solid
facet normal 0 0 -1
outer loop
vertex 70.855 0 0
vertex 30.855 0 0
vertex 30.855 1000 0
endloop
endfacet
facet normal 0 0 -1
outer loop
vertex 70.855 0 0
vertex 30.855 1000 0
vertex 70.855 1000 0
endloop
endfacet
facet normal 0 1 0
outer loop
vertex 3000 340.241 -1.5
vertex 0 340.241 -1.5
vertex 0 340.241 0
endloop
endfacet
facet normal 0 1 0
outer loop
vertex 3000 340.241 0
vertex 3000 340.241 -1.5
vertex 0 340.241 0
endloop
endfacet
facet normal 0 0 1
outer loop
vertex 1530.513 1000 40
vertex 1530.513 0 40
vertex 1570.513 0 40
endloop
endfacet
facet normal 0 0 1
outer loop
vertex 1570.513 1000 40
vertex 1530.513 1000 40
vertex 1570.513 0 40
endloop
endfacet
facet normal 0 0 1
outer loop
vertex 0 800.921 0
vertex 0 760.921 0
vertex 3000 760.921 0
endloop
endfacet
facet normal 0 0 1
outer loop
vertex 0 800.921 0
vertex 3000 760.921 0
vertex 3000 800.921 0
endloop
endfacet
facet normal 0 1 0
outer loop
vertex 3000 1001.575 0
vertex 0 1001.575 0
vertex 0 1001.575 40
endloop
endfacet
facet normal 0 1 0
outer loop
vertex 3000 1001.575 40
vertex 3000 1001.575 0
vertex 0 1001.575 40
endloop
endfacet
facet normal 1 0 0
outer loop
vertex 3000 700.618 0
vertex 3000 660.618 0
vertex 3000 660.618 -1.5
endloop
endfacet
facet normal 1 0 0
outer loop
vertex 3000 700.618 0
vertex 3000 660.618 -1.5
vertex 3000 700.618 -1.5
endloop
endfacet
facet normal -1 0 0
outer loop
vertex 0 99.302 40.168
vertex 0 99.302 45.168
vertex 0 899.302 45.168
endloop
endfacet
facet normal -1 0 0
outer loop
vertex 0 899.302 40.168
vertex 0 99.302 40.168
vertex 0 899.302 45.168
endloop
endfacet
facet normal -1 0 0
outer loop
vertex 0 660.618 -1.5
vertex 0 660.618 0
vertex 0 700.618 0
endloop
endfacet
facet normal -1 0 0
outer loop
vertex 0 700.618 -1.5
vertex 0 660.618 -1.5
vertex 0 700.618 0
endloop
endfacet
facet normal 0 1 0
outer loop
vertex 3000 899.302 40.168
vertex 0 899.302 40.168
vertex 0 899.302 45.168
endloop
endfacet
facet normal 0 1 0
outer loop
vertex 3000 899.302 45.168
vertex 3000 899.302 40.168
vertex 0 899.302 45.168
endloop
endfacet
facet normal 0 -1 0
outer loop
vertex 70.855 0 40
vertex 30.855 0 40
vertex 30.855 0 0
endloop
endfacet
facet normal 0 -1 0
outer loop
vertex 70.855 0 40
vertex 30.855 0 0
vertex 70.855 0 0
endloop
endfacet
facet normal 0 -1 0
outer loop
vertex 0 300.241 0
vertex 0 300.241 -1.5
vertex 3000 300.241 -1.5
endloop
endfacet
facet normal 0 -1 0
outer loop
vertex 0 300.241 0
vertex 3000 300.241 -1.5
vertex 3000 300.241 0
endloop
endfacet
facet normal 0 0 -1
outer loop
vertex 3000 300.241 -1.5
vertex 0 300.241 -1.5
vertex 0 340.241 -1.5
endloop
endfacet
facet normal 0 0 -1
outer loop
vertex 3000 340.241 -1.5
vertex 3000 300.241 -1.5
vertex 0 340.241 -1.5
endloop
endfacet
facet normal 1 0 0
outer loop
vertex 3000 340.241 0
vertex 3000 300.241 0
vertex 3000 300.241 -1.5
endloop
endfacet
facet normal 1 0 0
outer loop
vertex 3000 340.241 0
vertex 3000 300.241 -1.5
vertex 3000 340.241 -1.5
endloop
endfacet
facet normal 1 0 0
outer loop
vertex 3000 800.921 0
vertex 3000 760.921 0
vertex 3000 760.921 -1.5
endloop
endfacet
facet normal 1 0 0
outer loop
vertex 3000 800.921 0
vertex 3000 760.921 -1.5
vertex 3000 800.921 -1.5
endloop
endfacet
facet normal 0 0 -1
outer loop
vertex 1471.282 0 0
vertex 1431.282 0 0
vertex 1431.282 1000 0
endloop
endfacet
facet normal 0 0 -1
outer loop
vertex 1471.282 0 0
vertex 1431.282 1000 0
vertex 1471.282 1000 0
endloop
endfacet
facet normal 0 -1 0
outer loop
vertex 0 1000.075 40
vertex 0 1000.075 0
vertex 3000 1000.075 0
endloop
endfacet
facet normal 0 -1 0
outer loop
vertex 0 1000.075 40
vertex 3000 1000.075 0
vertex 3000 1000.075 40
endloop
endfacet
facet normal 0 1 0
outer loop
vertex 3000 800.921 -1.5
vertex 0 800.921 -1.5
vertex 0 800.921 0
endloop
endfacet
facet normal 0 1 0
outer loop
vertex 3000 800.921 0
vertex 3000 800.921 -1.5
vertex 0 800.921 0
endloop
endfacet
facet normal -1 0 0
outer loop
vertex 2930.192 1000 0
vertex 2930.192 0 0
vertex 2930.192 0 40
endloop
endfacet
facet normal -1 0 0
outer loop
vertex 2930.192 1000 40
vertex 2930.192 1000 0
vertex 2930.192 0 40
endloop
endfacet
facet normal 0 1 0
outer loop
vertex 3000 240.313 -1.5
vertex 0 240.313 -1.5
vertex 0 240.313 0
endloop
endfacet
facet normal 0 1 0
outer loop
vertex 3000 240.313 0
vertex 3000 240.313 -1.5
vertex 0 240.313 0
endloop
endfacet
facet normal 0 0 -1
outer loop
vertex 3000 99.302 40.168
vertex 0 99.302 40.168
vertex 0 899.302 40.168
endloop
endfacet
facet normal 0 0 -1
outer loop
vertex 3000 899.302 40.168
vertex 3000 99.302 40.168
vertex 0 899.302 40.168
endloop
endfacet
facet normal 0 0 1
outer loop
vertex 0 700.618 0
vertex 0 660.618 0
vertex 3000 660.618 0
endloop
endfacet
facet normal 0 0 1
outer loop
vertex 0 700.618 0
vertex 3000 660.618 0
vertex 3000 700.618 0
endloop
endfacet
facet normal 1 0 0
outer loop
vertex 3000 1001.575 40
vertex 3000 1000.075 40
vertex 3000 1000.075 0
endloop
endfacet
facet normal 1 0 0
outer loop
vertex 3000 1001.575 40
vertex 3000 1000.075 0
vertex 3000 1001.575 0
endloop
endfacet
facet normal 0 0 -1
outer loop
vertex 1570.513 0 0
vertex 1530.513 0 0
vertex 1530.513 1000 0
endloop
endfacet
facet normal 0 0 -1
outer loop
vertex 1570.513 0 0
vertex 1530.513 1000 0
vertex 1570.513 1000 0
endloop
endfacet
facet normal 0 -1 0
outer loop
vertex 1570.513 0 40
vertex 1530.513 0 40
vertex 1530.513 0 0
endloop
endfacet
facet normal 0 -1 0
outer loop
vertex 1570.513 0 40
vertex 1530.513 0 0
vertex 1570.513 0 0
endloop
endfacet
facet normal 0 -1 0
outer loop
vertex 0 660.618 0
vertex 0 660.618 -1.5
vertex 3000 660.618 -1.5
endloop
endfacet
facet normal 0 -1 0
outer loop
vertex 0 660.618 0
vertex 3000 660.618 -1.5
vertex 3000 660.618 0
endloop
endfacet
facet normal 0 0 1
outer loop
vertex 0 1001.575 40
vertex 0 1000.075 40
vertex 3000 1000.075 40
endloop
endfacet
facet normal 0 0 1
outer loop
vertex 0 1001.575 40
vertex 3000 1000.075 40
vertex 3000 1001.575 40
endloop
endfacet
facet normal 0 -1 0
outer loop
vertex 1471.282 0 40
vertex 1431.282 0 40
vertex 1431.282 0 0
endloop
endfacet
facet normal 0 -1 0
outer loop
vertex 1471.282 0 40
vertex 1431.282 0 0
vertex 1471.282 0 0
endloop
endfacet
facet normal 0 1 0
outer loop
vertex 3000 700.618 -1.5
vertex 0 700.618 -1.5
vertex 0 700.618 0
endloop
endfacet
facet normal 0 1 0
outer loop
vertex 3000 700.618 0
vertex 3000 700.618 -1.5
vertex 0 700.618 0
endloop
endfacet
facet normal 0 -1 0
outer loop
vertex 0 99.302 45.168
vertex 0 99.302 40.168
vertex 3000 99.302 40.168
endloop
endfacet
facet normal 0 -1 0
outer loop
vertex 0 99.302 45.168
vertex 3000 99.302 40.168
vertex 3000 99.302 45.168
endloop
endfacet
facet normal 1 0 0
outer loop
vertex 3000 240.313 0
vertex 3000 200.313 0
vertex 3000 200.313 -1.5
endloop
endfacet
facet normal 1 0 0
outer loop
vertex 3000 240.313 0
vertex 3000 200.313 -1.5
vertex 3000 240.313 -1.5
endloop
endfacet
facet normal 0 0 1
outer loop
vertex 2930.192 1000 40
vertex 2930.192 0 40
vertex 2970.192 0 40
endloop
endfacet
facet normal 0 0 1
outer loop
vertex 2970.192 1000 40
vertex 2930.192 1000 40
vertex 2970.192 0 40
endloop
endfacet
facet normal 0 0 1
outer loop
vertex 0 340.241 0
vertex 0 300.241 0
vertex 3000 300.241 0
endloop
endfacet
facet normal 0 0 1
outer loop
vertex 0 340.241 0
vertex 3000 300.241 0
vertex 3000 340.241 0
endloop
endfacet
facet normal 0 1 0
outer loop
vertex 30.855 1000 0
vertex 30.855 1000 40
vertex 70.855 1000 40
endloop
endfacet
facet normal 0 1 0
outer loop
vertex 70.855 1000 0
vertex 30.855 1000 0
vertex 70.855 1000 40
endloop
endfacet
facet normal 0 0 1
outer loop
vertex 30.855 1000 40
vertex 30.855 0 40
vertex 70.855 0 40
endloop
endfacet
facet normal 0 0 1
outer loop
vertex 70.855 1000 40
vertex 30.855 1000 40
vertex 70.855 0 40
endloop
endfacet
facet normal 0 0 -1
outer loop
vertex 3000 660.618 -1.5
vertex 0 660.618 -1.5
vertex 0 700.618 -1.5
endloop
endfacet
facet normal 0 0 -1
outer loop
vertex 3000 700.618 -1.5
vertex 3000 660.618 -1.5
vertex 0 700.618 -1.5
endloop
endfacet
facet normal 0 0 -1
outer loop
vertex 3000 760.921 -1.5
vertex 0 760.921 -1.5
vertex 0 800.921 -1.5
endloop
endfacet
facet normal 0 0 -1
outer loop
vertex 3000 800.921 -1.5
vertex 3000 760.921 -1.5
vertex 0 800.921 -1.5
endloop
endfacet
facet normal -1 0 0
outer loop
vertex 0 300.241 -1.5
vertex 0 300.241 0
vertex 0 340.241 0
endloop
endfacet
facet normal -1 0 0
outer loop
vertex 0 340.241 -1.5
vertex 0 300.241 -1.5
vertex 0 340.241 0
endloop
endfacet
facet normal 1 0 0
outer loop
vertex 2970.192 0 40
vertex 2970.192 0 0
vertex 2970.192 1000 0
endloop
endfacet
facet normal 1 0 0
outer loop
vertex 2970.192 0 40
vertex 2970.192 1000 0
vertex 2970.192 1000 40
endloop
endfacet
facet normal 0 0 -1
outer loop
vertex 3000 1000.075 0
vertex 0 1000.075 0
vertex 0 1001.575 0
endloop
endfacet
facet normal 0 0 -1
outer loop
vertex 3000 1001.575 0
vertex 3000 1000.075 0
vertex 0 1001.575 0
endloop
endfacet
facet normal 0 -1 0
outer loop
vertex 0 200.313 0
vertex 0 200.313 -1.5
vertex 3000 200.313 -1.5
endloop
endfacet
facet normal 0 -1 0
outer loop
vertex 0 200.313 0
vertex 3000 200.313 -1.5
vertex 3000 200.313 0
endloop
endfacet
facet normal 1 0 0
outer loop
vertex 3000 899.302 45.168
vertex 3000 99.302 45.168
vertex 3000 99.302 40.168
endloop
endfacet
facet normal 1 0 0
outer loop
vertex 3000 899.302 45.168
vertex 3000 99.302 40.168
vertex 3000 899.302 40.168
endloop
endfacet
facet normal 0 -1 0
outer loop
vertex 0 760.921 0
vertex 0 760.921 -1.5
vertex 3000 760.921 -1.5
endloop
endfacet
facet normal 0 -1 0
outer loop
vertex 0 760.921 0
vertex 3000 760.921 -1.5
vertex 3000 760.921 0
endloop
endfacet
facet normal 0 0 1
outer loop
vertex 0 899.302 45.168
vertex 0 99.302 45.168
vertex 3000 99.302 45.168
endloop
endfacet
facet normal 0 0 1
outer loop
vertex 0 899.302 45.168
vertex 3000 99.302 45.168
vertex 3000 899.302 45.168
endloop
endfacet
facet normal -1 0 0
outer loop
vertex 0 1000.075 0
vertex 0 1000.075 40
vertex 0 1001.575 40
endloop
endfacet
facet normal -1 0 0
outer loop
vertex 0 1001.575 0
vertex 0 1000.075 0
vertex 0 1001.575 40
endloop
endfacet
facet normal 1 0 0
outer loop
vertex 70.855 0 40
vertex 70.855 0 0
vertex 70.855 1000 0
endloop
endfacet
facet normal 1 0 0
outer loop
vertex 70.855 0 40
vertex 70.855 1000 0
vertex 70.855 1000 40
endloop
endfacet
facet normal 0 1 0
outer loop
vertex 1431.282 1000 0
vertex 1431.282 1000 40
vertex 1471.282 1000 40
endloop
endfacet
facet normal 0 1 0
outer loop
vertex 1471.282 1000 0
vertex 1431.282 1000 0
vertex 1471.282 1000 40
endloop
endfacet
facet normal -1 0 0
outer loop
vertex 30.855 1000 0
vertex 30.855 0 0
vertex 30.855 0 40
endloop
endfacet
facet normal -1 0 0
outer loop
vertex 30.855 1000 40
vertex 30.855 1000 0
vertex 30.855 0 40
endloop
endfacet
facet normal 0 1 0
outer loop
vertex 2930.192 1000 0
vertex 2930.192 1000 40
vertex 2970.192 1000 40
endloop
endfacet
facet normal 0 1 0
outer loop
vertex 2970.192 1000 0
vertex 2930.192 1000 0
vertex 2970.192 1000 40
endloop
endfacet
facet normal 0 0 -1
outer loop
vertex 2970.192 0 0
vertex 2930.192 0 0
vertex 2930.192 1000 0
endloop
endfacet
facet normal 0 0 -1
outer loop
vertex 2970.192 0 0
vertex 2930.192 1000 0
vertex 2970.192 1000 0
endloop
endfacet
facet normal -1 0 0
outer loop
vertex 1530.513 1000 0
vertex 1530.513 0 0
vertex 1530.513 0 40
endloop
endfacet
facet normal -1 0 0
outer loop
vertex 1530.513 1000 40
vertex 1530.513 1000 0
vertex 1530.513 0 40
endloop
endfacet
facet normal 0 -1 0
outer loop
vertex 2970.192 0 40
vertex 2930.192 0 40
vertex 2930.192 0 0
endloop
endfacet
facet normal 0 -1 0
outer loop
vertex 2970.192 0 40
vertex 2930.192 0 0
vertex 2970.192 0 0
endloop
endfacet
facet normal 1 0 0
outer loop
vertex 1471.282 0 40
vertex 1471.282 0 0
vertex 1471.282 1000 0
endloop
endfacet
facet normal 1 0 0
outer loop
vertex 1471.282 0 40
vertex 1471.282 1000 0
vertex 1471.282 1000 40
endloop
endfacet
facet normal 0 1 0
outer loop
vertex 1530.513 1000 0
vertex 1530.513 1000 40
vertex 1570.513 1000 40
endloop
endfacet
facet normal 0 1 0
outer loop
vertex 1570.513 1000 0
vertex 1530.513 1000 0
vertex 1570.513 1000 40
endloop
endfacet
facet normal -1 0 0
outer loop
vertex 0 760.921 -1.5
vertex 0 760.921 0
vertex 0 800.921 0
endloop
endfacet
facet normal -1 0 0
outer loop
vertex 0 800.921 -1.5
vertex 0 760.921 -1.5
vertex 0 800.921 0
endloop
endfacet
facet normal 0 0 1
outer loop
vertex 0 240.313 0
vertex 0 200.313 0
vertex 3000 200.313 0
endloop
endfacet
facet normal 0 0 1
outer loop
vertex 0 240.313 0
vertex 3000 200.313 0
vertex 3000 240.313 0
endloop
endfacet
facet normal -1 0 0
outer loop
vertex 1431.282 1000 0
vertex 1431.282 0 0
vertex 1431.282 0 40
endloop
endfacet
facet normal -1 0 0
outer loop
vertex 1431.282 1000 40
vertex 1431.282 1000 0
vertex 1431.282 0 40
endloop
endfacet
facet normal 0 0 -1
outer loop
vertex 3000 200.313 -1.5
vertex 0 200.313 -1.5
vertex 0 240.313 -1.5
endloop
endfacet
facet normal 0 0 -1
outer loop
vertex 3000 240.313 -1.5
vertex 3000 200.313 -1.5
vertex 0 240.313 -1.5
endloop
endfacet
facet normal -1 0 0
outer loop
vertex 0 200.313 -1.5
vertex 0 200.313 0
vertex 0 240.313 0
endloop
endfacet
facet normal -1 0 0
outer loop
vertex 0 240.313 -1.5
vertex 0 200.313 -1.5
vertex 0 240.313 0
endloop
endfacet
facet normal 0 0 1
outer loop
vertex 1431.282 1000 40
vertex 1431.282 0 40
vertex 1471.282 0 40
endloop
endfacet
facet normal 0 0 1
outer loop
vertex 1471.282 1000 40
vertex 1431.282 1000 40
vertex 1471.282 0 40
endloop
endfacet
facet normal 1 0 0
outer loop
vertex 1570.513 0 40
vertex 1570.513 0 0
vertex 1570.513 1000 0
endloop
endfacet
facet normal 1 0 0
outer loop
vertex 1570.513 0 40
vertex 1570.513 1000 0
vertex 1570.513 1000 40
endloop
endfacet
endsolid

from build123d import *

# Parameters (mm, degrees)
F0_W     = 40
F0_H     = 40
F1_DEPTH = 1000
F2_W     = 40
F2_H     = 1.5
F3_DEPTH = 3000
F4_W     = 1.5
F4_H     = 40
F5_DEPTH = 3000
F6_W     = 800
F6_H     = 5
F7_DEPTH = 3000


with BuildPart() as f1:
    # F0 (on Front) → F1 (new body)
    with BuildSketch(Plane.XZ):
        with Locations((50.854834, 20)):
            Rectangle(F0_W, F0_H)
        with Locations((1451.282043, 20)):
            Rectangle(F0_W, F0_H)
        with Locations((1550.51281, 20)):
            Rectangle(F0_W, F0_H)
        with Locations((2950.191994, 20)):
            Rectangle(F0_W, F0_H)
    extrude(amount=-F1_DEPTH)


with BuildPart() as f3:
    # F2 (on Right) → F3 (new body)
    with BuildSketch(Plane.YZ):
        with Locations((780.920882, -0.75)):
            Rectangle(F2_W, F2_H)
        with Locations((680.61765, -0.75)):
            Rectangle(F2_W, F2_H)
        with Locations((320.240934, -0.75)):
            Rectangle(F2_W, F2_H)
        with Locations((220.313196, -0.75)):
            Rectangle(F2_W, F2_H)
    extrude(amount=F3_DEPTH)


with BuildPart() as f5:
    # F4 (on Right) → F5 (new body)
    with BuildSketch(Plane.YZ):
        with Locations((1000.824506, 20)):
            Rectangle(F4_W, F4_H)
    extrude(amount=F5_DEPTH)


with BuildPart() as f7:
    # F6 (on Right) → F7 (new body)
    with BuildSketch(Plane.YZ):
        with Locations((499.302076, 42.668136)):
            Rectangle(F6_W, F6_H)
    extrude(amount=F7_DEPTH)


solid = Compound([f1.part, f3.part, f5.part, f7.part])
